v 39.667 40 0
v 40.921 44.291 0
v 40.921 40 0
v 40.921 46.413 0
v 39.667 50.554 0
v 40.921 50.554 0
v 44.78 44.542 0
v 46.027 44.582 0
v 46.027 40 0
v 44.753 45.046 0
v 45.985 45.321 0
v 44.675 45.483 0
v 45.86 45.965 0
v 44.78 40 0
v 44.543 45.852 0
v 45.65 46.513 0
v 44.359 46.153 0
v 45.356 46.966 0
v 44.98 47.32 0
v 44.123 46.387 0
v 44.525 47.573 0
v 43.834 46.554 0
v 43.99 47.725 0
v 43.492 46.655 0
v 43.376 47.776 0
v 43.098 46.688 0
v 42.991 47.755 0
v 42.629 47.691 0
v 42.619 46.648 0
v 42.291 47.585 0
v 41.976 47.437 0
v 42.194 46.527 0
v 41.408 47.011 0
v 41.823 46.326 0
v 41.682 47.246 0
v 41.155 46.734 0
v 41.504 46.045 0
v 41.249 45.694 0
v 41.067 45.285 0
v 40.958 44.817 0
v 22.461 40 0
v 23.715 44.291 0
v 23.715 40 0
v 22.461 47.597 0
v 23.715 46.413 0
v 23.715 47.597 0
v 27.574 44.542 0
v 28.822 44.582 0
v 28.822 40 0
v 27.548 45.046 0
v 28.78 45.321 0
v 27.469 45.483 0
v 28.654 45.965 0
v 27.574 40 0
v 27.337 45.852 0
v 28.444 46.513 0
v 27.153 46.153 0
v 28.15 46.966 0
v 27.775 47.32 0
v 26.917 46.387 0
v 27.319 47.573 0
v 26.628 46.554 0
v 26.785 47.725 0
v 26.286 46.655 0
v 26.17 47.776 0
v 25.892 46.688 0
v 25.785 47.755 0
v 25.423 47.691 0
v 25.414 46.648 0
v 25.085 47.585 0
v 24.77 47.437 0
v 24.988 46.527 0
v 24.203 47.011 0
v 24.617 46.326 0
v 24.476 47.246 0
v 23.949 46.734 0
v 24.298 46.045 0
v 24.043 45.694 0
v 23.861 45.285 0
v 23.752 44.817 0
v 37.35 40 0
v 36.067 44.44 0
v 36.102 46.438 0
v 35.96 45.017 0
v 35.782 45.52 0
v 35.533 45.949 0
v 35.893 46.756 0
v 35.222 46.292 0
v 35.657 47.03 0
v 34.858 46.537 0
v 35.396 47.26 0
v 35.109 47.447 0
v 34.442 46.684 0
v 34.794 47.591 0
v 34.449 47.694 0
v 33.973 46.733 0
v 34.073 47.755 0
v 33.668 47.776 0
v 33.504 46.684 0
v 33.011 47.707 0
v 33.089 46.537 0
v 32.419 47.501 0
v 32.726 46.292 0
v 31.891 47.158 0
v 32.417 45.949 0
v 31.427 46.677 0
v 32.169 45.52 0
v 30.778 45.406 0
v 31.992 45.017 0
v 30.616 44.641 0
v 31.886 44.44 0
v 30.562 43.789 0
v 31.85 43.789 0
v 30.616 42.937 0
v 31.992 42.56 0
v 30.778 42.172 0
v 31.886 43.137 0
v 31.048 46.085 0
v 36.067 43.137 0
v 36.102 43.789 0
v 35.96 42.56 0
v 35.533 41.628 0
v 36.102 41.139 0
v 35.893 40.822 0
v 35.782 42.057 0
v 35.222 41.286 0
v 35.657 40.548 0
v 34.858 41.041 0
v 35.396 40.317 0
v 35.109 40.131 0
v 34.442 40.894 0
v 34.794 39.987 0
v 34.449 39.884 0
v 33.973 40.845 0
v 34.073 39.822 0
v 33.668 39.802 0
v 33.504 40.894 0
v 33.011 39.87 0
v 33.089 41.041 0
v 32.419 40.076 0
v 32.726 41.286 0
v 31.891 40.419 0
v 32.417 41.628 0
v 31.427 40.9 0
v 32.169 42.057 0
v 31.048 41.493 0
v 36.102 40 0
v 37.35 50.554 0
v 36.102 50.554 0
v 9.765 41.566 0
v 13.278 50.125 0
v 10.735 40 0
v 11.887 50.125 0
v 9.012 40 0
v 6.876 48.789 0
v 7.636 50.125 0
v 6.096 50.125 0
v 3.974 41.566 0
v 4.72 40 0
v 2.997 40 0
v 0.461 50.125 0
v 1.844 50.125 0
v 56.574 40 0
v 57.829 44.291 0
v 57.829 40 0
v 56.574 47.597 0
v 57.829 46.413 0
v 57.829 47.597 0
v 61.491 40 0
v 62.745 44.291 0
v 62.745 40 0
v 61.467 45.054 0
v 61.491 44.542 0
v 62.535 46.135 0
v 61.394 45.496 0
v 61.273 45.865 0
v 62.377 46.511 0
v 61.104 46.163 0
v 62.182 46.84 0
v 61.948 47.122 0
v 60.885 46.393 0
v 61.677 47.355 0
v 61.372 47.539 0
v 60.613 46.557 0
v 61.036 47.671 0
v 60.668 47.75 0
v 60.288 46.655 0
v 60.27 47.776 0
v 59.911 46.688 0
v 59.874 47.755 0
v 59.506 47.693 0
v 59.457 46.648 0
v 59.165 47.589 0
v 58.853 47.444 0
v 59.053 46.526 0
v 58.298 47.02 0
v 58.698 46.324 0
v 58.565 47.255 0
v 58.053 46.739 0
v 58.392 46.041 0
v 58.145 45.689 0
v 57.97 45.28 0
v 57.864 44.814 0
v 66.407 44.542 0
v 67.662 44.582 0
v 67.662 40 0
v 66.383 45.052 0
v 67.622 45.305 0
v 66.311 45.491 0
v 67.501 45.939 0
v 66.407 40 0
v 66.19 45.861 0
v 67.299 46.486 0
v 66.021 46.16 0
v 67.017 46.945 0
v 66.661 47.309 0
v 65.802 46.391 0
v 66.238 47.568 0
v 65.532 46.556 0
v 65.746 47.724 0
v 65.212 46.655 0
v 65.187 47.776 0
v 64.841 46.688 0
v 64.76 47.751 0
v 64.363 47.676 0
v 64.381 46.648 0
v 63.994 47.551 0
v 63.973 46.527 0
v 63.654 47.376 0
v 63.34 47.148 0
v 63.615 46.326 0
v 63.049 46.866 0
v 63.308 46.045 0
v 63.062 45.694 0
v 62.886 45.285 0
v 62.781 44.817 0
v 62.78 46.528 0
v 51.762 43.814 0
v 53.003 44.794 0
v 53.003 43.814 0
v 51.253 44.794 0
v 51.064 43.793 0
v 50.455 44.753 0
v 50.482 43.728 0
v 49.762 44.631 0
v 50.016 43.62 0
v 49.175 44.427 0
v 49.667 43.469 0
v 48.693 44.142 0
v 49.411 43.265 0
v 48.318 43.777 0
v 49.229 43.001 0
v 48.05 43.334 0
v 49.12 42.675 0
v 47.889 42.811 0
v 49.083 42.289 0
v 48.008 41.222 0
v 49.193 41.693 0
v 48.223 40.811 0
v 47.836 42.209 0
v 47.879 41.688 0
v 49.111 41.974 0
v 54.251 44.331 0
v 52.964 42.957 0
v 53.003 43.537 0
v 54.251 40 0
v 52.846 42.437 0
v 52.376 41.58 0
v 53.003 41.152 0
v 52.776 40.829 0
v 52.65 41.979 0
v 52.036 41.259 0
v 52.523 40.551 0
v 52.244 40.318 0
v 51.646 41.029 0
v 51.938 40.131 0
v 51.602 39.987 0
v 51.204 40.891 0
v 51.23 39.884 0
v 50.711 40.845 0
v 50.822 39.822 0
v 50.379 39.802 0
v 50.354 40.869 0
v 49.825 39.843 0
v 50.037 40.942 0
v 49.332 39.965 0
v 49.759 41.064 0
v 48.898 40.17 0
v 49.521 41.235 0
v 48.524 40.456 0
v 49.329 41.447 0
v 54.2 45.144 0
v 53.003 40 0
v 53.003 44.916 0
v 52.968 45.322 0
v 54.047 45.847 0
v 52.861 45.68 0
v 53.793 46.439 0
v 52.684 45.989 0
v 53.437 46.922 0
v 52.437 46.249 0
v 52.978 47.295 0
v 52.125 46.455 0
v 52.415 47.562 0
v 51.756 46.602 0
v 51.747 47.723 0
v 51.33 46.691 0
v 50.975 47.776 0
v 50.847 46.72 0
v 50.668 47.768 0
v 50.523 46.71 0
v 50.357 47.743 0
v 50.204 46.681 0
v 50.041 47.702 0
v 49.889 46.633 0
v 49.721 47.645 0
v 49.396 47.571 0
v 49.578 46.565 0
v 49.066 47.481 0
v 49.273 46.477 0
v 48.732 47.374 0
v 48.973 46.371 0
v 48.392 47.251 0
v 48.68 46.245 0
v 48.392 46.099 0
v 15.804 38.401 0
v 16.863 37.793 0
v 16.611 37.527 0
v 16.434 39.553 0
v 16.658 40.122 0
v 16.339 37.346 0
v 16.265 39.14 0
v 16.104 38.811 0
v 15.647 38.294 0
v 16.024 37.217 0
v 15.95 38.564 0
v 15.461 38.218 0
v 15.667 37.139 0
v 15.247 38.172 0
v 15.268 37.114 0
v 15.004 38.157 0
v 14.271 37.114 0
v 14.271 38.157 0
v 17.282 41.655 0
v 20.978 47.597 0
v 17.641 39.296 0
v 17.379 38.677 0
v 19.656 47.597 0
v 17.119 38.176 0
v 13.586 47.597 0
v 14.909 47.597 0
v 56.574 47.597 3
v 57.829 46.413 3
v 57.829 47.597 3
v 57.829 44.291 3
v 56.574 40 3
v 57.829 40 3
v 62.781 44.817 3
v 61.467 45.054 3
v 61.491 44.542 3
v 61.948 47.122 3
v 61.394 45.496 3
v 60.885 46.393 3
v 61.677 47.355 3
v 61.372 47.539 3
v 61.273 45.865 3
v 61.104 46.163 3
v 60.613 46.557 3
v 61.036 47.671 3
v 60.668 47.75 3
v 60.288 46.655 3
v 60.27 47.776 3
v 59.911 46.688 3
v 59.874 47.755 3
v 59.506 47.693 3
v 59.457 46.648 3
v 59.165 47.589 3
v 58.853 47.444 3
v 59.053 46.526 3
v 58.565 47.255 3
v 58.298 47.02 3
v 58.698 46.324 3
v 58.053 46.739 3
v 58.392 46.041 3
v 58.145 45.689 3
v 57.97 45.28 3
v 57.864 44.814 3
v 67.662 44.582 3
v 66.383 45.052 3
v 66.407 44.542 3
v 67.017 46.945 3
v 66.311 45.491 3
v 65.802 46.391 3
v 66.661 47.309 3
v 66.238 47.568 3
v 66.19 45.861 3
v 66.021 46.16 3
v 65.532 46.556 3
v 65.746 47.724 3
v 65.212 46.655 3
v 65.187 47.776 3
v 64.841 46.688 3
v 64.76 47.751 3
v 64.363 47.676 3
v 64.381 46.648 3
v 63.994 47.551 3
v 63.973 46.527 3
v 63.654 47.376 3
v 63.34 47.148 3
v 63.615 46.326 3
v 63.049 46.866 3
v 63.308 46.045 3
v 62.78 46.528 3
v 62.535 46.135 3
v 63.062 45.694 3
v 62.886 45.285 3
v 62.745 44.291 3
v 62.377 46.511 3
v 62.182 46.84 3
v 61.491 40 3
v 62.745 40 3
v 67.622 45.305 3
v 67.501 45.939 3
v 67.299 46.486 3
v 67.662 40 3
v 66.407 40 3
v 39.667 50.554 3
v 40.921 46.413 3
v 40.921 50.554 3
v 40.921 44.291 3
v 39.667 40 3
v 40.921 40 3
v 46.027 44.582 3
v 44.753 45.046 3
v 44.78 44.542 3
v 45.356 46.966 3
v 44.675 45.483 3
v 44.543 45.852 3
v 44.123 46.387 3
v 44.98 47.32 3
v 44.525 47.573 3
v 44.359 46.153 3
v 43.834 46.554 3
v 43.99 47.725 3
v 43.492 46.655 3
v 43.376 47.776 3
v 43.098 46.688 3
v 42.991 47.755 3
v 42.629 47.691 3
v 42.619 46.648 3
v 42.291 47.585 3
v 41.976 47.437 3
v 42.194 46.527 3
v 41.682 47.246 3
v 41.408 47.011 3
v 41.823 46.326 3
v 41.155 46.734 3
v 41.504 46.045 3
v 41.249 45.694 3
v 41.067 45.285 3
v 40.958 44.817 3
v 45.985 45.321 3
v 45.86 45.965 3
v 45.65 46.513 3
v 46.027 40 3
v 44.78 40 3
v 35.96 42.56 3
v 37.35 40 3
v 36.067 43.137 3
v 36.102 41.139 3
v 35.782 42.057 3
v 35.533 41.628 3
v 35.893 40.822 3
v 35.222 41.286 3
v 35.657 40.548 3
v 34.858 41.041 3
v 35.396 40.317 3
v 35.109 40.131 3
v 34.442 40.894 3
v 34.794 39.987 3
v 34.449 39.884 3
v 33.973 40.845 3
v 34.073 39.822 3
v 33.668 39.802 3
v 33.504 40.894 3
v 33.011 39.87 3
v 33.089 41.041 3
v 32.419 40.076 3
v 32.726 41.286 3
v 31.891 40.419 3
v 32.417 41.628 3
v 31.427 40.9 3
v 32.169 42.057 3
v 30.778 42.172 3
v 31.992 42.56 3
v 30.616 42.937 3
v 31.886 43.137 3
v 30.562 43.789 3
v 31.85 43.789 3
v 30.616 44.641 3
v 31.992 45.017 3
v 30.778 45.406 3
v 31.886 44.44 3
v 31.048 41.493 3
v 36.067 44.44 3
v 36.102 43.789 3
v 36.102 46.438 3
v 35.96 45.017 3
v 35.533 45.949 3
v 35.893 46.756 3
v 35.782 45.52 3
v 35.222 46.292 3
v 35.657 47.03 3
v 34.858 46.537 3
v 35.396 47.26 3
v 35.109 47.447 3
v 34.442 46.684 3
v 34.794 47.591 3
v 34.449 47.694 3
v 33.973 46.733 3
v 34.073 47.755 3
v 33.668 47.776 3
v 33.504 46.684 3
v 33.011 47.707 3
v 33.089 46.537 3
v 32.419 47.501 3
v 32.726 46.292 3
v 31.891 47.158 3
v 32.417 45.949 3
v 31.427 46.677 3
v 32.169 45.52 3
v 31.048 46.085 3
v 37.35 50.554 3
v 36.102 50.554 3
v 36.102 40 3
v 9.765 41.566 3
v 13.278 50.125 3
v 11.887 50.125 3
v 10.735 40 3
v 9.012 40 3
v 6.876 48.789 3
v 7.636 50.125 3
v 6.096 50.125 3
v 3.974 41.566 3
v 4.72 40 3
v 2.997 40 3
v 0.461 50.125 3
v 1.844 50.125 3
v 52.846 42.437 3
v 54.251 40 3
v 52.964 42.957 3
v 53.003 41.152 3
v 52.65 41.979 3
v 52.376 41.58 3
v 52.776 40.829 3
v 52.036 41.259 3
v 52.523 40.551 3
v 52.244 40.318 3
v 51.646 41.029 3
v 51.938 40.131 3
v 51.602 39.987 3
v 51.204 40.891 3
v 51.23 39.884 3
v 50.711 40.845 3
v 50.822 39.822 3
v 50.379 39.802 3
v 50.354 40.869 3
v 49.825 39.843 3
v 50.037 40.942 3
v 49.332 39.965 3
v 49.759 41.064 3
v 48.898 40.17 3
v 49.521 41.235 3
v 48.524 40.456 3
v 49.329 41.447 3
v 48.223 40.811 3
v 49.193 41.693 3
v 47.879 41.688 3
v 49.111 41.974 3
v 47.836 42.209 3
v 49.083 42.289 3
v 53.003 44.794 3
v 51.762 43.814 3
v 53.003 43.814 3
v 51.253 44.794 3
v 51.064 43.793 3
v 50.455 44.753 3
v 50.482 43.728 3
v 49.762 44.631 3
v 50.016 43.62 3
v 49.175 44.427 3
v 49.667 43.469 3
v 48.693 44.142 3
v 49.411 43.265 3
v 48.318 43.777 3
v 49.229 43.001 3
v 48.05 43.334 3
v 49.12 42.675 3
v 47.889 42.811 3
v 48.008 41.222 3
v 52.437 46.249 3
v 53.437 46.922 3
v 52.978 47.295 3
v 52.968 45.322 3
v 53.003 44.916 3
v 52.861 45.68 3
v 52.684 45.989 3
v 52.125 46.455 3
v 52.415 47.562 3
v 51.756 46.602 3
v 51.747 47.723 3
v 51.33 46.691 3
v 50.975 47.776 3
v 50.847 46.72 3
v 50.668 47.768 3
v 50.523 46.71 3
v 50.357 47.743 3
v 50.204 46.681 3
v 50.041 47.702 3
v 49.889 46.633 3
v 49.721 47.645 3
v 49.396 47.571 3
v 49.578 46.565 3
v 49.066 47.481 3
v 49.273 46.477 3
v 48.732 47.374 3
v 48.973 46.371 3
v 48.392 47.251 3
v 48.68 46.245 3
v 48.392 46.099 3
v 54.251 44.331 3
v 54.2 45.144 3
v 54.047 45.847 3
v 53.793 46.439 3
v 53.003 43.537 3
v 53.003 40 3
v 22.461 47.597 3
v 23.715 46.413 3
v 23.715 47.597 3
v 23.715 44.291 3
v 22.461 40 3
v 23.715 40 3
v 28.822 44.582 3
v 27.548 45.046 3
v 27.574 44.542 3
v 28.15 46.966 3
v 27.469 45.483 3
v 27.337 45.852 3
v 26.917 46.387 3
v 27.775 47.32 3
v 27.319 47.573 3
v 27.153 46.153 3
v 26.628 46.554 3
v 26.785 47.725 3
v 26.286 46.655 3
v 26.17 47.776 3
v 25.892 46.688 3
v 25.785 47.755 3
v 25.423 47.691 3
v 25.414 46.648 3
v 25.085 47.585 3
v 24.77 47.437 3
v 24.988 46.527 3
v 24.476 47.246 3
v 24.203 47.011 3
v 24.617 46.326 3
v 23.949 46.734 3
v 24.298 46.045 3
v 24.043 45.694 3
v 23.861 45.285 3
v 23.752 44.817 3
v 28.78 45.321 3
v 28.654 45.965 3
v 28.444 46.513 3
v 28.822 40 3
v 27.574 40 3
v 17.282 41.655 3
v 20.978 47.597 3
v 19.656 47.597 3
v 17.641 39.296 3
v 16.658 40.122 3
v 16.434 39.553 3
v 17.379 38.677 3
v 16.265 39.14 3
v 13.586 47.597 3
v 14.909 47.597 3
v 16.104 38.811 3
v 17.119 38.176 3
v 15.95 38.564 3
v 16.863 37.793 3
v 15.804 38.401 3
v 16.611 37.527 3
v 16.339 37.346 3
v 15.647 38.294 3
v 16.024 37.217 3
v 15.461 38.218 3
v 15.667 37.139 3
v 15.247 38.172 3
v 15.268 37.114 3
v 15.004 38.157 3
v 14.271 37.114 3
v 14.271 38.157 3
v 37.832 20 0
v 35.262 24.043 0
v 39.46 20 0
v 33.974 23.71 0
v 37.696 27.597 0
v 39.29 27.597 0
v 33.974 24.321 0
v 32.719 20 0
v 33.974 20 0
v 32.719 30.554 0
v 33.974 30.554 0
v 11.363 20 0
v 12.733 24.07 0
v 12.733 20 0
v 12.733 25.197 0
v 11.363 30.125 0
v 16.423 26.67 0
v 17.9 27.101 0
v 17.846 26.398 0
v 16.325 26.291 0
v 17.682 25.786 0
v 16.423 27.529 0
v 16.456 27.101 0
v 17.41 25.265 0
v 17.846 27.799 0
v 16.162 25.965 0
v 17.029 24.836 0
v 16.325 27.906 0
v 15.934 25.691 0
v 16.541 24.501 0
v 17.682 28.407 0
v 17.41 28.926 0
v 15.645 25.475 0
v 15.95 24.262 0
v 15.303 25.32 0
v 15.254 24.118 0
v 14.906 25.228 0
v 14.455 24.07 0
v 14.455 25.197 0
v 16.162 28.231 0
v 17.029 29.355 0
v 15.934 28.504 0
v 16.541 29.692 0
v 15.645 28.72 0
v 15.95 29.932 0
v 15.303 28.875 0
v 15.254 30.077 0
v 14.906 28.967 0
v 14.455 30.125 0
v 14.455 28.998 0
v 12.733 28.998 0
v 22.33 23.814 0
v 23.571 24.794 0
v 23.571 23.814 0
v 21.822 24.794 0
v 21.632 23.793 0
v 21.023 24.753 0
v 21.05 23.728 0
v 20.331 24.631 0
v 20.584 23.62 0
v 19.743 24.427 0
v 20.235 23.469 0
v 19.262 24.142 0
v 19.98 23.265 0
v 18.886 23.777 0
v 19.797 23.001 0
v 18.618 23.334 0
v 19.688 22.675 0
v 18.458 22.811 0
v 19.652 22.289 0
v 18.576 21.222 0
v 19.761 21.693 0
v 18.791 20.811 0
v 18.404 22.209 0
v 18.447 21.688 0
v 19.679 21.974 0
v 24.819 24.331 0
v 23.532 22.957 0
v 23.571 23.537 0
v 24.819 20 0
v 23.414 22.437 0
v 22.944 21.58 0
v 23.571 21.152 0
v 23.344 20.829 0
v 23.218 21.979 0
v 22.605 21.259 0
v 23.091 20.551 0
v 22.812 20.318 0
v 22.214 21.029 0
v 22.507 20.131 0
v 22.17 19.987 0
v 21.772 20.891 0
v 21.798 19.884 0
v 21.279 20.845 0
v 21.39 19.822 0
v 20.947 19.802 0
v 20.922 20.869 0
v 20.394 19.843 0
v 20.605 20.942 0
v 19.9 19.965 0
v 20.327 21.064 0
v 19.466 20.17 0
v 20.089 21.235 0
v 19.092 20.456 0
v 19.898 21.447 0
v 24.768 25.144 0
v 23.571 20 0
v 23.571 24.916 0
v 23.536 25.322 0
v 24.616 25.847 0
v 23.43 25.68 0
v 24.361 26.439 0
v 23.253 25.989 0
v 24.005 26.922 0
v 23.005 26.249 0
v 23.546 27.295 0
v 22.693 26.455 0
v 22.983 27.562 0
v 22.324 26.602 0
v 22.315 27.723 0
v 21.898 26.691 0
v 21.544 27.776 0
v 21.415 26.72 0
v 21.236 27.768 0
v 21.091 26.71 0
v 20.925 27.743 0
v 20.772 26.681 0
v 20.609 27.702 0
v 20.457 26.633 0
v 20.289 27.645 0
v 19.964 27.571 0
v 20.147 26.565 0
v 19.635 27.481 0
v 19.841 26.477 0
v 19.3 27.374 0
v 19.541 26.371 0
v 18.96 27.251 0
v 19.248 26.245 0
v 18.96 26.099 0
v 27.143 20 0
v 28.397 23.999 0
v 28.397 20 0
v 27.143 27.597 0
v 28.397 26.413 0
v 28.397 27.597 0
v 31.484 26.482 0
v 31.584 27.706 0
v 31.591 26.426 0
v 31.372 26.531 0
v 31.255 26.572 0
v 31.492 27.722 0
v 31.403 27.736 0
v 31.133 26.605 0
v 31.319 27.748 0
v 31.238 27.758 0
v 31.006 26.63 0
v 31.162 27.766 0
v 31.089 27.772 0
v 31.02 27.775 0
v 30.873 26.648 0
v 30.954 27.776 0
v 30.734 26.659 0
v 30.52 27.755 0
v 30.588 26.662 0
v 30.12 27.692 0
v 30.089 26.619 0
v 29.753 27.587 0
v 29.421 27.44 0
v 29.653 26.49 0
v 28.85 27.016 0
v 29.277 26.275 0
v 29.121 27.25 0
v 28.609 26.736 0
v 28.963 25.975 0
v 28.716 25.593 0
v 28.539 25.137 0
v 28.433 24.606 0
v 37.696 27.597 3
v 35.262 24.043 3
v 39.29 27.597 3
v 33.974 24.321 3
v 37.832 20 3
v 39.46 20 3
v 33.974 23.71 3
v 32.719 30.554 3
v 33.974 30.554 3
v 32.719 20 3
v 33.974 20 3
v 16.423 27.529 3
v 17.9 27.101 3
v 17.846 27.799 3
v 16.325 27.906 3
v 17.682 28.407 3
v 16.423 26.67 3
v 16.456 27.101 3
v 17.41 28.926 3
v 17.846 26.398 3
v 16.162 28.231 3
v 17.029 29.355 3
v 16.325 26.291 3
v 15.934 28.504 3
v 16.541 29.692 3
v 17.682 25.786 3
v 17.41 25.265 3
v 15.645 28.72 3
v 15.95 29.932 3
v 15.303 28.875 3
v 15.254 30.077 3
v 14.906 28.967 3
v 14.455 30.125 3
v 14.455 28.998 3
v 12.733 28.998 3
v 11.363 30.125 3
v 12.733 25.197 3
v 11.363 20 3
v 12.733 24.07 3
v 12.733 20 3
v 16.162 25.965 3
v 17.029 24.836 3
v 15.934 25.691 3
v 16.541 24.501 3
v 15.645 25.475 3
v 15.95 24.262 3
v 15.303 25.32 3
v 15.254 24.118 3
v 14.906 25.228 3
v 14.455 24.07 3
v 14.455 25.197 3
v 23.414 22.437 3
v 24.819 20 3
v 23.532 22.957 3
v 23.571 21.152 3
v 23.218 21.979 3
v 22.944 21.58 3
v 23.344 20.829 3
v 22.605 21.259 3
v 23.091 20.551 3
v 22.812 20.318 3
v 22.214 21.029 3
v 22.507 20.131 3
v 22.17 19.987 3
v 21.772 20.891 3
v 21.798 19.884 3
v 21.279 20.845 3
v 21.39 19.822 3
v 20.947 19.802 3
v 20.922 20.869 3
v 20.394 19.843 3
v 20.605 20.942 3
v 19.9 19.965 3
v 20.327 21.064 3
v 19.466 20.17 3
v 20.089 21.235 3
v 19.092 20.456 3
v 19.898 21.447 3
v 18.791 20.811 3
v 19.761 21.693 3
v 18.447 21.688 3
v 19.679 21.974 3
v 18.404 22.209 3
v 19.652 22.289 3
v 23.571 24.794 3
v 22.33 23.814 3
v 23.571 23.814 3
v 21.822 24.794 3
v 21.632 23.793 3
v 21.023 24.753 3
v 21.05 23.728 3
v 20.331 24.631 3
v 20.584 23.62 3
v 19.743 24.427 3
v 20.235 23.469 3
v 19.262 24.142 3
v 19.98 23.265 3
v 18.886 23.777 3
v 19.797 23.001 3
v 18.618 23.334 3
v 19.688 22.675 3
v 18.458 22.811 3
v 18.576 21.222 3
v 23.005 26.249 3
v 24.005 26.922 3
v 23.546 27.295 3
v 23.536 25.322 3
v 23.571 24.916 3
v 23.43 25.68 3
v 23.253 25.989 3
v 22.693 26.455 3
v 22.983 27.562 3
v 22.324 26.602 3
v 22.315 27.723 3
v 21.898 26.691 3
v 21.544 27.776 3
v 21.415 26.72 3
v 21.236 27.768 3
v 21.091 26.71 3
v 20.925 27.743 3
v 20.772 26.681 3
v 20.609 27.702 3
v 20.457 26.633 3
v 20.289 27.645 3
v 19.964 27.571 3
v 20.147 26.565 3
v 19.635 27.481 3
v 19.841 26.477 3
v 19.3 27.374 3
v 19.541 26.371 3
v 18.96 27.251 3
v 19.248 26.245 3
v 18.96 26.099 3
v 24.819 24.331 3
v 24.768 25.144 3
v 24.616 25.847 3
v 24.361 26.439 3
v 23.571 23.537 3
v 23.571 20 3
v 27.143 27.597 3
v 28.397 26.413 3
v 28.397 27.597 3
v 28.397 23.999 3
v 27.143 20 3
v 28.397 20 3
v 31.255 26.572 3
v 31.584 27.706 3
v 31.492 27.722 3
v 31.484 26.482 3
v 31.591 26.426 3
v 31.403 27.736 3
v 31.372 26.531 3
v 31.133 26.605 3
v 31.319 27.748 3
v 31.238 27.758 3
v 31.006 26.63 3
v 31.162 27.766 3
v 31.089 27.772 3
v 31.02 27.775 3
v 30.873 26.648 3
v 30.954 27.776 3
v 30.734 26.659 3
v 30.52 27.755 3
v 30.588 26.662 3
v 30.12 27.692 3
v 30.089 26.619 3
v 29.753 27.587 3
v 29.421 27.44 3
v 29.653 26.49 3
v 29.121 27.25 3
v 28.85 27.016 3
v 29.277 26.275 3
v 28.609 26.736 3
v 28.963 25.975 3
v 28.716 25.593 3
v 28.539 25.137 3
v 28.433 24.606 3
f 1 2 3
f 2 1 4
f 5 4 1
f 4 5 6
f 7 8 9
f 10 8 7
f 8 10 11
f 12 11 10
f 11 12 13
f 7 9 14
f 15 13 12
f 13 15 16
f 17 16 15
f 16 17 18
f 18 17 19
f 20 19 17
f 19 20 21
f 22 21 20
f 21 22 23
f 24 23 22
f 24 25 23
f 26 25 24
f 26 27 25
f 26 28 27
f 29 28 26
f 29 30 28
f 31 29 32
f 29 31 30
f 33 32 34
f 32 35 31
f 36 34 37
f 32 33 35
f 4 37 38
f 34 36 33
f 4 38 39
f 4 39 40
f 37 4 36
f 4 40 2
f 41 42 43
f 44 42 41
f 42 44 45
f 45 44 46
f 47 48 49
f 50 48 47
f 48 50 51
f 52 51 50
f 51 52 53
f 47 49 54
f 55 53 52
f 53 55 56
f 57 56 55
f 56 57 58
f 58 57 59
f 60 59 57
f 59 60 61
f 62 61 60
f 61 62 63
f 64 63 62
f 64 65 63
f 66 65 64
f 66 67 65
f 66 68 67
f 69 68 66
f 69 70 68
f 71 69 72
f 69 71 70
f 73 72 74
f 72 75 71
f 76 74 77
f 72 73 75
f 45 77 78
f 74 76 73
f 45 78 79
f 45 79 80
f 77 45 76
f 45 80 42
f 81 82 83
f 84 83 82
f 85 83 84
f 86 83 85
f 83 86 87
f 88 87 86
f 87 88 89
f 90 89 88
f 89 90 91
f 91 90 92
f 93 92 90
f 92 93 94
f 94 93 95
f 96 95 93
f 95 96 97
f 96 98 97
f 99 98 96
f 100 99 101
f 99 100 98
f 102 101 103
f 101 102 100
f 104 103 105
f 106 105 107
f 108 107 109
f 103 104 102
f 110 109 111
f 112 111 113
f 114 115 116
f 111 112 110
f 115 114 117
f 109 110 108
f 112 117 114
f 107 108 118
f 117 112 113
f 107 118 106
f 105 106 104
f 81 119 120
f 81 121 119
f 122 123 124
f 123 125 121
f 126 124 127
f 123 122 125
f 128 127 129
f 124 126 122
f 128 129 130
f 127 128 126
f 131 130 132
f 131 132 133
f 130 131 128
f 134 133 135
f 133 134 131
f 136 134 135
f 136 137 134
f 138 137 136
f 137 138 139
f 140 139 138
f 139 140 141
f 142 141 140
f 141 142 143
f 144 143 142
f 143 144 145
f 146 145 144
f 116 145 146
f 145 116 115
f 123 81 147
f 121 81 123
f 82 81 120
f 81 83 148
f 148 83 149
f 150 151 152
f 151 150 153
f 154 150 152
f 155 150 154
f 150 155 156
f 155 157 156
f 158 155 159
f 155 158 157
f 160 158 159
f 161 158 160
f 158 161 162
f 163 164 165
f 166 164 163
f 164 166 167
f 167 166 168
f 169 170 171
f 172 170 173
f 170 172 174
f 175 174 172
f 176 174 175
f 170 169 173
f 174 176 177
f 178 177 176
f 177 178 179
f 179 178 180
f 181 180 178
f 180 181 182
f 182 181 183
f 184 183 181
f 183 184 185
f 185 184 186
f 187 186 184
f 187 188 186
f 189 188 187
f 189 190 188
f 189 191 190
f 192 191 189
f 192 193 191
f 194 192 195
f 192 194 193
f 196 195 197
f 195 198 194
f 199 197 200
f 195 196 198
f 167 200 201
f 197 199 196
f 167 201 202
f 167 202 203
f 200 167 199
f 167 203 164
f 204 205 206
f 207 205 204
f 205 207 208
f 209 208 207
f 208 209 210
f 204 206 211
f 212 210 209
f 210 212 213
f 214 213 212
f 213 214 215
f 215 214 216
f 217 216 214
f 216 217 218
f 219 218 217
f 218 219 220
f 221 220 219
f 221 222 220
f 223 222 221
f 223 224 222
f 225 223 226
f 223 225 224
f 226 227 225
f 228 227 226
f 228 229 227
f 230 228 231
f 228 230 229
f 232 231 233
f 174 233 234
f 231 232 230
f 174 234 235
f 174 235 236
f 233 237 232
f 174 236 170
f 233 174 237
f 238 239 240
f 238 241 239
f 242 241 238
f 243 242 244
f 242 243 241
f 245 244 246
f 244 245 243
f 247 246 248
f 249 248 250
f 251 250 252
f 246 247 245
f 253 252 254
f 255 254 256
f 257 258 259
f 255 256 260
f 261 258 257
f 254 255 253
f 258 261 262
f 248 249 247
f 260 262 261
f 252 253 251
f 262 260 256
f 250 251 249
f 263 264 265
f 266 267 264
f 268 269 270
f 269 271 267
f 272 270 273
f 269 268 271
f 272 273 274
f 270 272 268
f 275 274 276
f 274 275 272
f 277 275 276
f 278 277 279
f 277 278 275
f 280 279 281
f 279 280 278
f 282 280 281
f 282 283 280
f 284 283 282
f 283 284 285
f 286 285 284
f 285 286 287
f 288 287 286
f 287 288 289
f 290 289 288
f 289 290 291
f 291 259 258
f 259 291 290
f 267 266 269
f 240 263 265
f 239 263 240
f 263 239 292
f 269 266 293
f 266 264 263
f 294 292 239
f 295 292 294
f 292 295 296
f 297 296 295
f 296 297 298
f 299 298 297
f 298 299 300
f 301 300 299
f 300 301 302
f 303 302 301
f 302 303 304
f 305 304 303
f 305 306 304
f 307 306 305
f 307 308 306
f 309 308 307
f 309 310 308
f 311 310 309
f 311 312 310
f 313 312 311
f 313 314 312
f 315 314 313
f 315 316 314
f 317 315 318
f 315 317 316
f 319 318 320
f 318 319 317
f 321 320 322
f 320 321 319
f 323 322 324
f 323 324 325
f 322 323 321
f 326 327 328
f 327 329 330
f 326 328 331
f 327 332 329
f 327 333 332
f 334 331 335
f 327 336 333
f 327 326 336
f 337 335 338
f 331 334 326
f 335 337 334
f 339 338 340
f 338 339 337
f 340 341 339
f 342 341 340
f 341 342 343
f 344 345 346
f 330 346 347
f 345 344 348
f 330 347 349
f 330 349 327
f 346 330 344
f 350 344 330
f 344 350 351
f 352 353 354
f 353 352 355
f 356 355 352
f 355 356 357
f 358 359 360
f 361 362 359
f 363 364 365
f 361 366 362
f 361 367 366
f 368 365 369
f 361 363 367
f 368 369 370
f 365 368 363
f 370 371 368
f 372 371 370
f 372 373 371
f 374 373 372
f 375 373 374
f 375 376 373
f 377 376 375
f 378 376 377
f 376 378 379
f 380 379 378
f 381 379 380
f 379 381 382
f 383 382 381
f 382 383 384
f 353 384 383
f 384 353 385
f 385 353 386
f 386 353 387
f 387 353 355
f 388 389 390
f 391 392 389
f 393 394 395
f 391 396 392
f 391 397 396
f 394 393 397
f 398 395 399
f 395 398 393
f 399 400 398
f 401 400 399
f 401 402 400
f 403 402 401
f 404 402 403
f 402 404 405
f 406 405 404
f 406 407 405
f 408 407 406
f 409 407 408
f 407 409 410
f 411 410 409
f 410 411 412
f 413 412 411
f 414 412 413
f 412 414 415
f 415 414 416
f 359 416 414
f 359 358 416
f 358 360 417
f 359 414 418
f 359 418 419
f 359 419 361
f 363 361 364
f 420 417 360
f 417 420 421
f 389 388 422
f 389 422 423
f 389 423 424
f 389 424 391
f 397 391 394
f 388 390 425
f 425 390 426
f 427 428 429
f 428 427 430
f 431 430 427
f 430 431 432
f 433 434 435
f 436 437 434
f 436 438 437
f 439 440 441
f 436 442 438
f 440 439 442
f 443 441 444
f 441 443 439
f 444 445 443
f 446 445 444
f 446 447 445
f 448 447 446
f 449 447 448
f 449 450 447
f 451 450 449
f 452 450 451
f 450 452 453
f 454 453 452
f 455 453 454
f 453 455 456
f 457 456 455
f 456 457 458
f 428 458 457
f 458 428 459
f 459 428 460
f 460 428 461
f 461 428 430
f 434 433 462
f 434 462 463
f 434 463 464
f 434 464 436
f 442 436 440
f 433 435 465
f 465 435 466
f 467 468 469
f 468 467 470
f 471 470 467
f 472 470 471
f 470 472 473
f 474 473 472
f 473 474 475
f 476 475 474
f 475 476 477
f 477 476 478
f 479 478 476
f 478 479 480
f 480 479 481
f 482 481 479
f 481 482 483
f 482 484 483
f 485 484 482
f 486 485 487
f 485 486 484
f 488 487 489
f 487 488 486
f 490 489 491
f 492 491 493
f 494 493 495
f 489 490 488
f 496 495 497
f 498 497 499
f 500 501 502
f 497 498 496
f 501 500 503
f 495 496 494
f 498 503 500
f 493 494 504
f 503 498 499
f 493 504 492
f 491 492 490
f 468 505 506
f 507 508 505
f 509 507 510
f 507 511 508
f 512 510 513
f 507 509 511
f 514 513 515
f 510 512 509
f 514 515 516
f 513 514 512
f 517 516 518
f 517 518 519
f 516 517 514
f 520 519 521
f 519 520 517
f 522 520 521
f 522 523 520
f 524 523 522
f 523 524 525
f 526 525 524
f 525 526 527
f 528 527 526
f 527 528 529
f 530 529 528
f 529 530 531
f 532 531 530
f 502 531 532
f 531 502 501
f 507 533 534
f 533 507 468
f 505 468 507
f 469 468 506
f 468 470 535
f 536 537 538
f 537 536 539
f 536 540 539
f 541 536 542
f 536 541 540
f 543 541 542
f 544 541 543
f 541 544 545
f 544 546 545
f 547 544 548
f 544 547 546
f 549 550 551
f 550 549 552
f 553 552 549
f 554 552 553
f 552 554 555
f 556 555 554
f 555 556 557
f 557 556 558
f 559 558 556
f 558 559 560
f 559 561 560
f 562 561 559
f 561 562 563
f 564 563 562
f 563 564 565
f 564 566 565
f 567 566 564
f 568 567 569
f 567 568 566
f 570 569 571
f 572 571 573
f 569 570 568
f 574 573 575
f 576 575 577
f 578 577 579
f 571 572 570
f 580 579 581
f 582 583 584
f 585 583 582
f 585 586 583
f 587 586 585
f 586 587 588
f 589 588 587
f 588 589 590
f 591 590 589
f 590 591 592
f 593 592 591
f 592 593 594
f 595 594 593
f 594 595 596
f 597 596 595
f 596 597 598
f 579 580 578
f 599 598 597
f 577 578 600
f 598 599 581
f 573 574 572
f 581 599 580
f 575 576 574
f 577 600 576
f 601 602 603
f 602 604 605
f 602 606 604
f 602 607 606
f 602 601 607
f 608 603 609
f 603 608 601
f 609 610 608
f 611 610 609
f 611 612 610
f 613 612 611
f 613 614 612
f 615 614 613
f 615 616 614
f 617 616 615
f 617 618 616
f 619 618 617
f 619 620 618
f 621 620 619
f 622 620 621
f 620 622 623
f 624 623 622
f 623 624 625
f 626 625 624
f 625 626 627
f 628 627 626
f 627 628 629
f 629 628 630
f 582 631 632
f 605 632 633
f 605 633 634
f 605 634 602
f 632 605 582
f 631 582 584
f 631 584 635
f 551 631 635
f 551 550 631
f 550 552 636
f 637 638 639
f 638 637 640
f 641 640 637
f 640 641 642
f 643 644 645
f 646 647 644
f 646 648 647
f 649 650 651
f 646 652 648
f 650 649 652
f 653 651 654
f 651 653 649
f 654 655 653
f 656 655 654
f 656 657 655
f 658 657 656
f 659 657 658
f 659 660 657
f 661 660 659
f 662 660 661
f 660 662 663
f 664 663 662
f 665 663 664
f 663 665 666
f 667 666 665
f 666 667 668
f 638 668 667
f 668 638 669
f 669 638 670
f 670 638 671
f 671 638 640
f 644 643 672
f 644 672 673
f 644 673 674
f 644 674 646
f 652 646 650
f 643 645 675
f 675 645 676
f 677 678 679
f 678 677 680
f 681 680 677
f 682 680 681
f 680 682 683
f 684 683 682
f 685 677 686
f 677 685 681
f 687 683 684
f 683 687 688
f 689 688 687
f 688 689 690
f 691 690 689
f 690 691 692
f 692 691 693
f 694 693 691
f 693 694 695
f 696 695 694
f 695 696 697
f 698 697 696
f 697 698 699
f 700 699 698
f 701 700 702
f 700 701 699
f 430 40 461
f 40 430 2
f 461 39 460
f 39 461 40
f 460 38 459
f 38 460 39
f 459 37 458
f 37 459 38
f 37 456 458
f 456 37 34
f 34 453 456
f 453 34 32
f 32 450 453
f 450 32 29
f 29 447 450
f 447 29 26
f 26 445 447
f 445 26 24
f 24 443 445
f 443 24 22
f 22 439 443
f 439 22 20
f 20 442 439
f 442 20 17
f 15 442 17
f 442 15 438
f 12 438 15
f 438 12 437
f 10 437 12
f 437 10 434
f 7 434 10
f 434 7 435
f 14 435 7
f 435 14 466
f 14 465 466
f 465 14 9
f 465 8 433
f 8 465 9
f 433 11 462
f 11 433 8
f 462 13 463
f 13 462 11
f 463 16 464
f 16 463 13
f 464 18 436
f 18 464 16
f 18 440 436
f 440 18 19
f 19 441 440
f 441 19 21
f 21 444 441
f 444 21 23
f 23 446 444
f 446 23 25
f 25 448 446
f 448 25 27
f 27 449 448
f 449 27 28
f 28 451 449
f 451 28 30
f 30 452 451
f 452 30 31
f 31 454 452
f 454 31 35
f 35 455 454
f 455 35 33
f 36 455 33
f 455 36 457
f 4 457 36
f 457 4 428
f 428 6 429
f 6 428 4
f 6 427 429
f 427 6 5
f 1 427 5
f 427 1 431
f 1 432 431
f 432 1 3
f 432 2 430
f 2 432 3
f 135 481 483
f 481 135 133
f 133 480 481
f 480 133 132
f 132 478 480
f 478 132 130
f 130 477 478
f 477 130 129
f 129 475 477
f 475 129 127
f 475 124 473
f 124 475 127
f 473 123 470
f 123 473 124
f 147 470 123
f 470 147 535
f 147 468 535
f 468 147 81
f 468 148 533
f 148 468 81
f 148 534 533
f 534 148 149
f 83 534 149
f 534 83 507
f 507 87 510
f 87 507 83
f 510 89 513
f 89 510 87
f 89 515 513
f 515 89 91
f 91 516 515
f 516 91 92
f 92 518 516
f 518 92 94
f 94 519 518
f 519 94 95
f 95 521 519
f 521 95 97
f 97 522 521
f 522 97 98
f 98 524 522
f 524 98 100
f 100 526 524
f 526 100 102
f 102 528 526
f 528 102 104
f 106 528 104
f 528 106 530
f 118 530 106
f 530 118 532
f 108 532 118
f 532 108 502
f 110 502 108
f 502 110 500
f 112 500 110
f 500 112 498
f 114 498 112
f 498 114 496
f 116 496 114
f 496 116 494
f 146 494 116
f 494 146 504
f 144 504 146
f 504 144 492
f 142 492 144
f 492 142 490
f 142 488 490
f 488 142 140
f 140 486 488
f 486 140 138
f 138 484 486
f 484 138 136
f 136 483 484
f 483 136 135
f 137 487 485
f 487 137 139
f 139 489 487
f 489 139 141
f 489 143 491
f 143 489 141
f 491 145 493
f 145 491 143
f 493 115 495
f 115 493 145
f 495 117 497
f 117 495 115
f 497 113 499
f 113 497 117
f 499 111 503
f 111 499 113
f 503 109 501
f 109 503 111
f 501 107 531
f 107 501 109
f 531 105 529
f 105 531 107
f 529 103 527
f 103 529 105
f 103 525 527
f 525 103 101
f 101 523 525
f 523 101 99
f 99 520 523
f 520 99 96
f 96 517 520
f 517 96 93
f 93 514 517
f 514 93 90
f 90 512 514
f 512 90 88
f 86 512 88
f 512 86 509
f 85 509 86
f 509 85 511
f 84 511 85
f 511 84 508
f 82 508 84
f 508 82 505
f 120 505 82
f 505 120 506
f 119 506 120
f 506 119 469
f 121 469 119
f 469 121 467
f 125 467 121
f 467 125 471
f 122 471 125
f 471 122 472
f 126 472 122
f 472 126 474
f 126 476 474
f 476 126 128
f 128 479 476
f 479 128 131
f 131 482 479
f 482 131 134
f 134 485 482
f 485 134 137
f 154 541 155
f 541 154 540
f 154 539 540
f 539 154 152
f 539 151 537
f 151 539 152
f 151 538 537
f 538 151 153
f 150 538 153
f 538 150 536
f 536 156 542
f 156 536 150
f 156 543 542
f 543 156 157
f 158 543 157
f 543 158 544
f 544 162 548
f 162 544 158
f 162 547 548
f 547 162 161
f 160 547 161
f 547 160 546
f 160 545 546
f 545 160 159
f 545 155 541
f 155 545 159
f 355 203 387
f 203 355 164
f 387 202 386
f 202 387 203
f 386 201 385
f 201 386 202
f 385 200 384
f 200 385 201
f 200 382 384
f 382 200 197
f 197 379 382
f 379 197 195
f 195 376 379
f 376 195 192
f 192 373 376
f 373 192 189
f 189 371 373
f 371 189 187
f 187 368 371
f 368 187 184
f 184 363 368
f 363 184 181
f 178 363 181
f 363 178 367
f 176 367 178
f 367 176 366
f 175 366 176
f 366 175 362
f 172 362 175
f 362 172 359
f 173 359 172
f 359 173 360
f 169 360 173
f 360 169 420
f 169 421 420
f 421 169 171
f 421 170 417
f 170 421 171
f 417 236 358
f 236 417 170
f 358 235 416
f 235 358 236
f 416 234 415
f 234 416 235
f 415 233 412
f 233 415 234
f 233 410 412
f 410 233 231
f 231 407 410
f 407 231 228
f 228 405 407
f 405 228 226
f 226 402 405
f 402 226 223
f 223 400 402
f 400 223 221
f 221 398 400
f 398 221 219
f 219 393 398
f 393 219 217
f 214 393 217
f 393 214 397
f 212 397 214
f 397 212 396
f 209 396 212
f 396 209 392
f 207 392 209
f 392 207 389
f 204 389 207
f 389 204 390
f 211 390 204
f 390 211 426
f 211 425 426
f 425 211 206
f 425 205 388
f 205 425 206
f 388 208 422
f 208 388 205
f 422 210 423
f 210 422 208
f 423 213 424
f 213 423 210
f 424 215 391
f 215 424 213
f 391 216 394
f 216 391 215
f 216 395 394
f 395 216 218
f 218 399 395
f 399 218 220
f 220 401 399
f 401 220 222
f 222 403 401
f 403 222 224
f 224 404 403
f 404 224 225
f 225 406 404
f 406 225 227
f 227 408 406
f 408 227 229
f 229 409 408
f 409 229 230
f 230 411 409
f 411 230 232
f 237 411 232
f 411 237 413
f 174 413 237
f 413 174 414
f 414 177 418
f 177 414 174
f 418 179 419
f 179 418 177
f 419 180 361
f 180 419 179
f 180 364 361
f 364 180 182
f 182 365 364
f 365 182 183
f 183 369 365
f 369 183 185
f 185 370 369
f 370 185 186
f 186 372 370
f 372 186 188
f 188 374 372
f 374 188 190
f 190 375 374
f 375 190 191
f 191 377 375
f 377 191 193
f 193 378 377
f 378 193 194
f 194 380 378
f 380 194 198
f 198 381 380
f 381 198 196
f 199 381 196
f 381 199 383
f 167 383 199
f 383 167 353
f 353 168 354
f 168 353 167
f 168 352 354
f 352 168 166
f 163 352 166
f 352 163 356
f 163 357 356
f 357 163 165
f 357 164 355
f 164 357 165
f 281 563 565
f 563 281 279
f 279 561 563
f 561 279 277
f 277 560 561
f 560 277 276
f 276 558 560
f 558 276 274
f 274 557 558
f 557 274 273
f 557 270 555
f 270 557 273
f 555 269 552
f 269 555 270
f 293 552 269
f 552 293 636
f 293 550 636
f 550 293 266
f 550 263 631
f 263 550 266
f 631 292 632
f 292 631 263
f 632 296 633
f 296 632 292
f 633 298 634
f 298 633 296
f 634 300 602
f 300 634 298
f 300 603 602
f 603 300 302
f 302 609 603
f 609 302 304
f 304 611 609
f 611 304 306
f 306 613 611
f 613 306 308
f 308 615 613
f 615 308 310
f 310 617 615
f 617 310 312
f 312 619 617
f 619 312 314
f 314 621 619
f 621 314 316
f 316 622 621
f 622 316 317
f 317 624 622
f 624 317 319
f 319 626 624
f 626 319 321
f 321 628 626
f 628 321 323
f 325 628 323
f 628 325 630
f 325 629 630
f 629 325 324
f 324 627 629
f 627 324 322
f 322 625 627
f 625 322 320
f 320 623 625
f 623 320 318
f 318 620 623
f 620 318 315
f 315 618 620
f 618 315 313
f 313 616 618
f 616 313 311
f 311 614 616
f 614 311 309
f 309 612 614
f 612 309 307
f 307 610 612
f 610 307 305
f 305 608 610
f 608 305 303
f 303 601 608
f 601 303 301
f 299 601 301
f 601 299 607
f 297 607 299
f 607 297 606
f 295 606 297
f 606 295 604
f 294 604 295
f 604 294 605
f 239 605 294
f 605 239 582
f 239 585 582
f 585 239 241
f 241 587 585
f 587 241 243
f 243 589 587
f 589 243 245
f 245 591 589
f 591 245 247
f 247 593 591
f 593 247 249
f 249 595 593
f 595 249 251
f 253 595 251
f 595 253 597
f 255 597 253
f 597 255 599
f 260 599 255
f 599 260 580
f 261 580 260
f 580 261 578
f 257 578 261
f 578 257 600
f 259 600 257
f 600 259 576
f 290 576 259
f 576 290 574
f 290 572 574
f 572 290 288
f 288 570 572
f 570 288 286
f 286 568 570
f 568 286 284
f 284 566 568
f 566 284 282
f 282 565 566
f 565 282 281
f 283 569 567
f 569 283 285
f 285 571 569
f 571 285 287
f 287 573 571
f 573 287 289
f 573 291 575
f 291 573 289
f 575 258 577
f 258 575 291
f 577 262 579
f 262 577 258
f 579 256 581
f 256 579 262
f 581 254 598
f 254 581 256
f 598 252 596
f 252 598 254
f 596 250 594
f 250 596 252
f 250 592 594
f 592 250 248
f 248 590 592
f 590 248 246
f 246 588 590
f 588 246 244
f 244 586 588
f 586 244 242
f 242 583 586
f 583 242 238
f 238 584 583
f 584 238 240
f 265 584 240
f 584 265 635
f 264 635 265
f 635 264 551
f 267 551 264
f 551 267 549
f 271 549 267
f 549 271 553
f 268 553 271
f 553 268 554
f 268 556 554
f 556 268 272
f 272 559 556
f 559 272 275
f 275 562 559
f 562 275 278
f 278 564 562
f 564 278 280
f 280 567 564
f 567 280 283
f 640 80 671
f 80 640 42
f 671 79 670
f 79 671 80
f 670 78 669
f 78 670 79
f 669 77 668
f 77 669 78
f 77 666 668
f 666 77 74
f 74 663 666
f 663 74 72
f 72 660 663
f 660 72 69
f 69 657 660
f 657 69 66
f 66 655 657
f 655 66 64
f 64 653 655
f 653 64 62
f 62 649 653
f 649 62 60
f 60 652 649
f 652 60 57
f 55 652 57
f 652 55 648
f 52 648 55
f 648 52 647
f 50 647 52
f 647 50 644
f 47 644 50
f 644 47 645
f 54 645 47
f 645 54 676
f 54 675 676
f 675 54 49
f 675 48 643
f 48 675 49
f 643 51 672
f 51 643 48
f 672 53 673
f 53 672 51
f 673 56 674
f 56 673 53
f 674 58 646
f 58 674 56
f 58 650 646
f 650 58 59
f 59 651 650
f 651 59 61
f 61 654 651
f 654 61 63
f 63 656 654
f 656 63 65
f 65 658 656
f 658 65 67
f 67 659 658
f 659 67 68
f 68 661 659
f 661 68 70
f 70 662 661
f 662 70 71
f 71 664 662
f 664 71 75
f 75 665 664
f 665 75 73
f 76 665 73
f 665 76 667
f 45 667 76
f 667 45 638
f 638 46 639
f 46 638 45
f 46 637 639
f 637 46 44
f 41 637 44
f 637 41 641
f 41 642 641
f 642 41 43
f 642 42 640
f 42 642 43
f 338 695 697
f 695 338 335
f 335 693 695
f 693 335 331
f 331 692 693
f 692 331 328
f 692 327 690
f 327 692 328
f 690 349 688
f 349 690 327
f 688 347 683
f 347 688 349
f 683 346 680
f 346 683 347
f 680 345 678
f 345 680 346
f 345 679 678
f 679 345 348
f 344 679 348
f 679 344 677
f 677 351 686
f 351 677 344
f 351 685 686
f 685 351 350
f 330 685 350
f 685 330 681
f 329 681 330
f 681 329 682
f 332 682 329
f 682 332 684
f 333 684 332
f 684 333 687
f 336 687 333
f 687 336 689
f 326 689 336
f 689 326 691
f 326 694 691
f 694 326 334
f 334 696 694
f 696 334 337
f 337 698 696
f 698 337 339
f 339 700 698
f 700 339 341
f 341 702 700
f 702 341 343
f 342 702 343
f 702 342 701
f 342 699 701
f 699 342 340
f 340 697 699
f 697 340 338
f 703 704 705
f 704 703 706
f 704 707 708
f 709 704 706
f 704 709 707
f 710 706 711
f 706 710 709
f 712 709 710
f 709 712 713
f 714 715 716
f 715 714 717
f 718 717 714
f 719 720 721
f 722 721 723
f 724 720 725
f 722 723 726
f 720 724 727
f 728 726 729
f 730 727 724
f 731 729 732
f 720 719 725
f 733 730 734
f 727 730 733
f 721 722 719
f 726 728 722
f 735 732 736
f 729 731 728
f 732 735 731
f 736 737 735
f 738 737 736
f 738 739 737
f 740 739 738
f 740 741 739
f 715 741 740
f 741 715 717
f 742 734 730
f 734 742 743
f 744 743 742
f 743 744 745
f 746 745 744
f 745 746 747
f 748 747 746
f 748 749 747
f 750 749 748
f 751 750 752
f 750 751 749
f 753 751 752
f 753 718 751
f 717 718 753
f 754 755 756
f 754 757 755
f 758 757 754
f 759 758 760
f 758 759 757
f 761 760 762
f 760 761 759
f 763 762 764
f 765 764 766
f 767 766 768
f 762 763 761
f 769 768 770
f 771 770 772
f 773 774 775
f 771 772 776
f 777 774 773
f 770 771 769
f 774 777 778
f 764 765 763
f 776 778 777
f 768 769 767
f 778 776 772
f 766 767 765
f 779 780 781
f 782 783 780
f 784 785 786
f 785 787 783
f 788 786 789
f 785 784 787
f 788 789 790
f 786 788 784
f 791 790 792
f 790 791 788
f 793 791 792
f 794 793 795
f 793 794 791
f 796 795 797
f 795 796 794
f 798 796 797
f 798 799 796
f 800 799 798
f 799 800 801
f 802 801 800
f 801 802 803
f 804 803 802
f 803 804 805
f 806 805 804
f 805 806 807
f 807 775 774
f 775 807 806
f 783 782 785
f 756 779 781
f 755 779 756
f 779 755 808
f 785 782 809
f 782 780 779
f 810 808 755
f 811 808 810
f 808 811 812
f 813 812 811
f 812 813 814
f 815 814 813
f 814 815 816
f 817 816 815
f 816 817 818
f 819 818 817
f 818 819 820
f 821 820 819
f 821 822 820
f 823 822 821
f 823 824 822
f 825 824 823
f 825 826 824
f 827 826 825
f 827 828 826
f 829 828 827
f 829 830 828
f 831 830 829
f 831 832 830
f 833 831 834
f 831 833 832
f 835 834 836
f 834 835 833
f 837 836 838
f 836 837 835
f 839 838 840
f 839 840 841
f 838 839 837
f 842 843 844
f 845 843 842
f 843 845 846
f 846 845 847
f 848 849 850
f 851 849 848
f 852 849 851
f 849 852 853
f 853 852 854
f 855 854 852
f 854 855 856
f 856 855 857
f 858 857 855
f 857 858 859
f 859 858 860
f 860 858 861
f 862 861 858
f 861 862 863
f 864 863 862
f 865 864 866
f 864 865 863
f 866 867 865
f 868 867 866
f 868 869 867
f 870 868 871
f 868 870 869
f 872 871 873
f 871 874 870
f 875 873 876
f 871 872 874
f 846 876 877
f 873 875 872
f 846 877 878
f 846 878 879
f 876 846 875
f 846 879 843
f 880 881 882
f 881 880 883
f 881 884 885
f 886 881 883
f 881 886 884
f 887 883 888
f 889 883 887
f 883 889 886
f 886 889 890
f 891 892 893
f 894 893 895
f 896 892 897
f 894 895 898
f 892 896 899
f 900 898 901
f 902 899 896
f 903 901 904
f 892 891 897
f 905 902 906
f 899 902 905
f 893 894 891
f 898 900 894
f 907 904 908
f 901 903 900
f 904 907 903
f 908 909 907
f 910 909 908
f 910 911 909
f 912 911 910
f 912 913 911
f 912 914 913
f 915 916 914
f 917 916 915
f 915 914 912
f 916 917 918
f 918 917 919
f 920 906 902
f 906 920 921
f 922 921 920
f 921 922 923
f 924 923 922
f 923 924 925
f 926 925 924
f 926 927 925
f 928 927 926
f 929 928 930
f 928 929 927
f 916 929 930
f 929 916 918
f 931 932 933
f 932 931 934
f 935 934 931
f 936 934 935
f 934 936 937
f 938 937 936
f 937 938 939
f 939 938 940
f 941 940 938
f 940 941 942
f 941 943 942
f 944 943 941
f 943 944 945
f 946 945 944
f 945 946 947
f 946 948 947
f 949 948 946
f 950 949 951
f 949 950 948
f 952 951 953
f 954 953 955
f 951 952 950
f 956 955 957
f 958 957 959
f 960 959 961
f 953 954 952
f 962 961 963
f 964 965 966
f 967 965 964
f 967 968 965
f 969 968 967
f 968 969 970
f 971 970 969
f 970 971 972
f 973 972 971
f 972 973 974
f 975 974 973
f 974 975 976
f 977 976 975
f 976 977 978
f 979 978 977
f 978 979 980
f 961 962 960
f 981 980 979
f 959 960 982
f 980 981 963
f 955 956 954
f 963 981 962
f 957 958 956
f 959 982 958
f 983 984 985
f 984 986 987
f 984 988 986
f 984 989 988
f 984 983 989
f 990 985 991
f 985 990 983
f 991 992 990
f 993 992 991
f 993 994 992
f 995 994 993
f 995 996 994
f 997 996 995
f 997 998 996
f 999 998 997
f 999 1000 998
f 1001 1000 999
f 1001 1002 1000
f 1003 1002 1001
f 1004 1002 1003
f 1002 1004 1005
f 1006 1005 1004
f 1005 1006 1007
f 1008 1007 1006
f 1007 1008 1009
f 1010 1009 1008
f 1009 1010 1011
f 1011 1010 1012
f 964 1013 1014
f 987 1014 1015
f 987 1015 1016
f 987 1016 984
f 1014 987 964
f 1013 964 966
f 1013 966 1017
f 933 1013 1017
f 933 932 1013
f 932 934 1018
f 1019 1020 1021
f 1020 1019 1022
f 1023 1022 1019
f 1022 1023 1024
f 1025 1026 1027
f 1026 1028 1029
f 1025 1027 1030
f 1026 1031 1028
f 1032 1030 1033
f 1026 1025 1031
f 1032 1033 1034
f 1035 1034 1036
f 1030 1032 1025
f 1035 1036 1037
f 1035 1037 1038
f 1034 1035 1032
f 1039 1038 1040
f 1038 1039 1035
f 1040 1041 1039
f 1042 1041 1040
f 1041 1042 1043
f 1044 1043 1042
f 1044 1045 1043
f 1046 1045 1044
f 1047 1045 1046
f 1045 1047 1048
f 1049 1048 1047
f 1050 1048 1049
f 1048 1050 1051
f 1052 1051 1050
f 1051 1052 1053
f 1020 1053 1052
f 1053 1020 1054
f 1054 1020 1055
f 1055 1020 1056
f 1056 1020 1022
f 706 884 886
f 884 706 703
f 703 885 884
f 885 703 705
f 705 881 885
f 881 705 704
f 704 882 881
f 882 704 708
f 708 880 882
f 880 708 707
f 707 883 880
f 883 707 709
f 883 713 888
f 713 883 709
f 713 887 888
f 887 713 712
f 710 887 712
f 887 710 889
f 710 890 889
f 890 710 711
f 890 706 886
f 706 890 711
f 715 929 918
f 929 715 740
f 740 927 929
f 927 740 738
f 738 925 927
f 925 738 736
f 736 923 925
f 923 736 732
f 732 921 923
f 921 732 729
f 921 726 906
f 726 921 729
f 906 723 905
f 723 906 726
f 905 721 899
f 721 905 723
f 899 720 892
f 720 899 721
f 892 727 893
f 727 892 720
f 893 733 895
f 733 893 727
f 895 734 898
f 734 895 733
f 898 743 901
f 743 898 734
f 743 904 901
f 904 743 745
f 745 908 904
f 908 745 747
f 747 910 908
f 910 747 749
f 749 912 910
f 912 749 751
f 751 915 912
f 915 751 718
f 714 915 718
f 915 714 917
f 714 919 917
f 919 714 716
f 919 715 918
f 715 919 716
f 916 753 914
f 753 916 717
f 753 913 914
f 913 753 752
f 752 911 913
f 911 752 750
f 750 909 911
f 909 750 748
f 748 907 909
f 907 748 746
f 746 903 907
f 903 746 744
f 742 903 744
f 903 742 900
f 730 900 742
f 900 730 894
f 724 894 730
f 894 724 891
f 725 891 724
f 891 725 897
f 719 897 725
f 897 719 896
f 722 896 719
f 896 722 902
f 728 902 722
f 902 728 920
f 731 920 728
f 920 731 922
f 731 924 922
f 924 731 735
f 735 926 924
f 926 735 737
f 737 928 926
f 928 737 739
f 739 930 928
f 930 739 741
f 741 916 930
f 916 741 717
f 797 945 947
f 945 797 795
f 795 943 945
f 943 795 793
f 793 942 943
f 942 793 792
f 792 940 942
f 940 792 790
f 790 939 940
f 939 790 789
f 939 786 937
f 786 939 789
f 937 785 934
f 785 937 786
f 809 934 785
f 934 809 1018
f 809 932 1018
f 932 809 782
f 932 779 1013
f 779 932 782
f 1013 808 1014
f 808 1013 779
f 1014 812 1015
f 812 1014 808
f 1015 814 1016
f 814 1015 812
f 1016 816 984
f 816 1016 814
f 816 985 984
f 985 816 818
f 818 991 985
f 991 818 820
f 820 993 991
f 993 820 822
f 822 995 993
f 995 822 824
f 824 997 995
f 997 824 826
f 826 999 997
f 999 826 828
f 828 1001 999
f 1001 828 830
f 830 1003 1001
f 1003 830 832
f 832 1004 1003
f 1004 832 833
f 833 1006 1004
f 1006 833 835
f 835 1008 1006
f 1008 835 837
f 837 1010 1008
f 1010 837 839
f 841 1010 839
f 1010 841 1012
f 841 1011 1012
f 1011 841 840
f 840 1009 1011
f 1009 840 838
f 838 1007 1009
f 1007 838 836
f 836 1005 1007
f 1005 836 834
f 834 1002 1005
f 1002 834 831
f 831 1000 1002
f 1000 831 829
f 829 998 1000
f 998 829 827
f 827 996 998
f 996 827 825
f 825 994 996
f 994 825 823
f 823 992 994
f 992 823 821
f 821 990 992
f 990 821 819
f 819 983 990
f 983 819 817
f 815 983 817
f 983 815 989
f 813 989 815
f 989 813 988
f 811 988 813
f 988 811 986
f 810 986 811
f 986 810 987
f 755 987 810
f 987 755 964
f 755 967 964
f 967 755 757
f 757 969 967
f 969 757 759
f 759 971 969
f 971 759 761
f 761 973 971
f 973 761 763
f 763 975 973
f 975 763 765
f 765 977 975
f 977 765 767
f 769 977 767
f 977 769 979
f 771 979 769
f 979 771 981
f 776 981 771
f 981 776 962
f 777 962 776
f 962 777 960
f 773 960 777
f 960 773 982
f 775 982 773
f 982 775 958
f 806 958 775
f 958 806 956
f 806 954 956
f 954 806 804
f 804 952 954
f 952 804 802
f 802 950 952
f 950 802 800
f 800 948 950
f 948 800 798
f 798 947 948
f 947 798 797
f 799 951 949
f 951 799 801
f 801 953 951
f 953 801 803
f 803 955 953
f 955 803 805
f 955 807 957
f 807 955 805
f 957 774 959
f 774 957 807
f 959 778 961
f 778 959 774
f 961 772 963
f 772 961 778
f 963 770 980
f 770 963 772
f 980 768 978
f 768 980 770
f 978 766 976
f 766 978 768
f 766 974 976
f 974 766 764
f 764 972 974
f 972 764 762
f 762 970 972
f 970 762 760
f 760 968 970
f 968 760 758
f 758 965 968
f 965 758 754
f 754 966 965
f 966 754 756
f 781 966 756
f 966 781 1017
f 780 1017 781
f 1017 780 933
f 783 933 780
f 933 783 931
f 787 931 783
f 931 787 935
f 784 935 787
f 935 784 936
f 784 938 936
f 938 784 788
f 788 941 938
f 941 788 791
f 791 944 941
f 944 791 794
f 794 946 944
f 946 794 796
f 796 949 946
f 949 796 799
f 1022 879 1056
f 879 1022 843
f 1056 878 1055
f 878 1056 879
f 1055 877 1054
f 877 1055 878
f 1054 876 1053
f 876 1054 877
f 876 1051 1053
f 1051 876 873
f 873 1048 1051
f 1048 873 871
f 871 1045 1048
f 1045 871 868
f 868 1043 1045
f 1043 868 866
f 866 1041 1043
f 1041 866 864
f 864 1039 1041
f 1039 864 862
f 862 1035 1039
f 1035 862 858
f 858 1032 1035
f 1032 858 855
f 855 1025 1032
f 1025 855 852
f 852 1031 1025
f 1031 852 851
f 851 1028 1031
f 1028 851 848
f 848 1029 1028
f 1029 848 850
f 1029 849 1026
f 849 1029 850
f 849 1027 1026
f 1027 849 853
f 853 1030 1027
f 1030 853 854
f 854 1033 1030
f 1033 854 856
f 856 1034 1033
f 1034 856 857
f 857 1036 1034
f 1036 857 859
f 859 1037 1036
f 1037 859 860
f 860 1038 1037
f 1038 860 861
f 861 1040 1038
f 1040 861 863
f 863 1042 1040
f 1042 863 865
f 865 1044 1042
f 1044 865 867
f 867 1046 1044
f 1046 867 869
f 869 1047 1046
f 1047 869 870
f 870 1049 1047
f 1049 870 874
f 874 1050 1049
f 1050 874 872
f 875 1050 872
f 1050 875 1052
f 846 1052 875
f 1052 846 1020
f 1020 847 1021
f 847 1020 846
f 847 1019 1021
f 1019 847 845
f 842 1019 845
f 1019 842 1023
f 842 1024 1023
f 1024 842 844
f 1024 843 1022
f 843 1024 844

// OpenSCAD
content1 = "Wyndham";
content2 = "Park";
font = "Liberation Sands";
translate ([0,40,0]) {
    linear_extrude(height=3) {
        text(content1,font=font,size=10);
    }
}
translate ([10,20,0]) {
    linear_extrude(height=3) {
        text(content2,font=font,size=10);
    }
}
